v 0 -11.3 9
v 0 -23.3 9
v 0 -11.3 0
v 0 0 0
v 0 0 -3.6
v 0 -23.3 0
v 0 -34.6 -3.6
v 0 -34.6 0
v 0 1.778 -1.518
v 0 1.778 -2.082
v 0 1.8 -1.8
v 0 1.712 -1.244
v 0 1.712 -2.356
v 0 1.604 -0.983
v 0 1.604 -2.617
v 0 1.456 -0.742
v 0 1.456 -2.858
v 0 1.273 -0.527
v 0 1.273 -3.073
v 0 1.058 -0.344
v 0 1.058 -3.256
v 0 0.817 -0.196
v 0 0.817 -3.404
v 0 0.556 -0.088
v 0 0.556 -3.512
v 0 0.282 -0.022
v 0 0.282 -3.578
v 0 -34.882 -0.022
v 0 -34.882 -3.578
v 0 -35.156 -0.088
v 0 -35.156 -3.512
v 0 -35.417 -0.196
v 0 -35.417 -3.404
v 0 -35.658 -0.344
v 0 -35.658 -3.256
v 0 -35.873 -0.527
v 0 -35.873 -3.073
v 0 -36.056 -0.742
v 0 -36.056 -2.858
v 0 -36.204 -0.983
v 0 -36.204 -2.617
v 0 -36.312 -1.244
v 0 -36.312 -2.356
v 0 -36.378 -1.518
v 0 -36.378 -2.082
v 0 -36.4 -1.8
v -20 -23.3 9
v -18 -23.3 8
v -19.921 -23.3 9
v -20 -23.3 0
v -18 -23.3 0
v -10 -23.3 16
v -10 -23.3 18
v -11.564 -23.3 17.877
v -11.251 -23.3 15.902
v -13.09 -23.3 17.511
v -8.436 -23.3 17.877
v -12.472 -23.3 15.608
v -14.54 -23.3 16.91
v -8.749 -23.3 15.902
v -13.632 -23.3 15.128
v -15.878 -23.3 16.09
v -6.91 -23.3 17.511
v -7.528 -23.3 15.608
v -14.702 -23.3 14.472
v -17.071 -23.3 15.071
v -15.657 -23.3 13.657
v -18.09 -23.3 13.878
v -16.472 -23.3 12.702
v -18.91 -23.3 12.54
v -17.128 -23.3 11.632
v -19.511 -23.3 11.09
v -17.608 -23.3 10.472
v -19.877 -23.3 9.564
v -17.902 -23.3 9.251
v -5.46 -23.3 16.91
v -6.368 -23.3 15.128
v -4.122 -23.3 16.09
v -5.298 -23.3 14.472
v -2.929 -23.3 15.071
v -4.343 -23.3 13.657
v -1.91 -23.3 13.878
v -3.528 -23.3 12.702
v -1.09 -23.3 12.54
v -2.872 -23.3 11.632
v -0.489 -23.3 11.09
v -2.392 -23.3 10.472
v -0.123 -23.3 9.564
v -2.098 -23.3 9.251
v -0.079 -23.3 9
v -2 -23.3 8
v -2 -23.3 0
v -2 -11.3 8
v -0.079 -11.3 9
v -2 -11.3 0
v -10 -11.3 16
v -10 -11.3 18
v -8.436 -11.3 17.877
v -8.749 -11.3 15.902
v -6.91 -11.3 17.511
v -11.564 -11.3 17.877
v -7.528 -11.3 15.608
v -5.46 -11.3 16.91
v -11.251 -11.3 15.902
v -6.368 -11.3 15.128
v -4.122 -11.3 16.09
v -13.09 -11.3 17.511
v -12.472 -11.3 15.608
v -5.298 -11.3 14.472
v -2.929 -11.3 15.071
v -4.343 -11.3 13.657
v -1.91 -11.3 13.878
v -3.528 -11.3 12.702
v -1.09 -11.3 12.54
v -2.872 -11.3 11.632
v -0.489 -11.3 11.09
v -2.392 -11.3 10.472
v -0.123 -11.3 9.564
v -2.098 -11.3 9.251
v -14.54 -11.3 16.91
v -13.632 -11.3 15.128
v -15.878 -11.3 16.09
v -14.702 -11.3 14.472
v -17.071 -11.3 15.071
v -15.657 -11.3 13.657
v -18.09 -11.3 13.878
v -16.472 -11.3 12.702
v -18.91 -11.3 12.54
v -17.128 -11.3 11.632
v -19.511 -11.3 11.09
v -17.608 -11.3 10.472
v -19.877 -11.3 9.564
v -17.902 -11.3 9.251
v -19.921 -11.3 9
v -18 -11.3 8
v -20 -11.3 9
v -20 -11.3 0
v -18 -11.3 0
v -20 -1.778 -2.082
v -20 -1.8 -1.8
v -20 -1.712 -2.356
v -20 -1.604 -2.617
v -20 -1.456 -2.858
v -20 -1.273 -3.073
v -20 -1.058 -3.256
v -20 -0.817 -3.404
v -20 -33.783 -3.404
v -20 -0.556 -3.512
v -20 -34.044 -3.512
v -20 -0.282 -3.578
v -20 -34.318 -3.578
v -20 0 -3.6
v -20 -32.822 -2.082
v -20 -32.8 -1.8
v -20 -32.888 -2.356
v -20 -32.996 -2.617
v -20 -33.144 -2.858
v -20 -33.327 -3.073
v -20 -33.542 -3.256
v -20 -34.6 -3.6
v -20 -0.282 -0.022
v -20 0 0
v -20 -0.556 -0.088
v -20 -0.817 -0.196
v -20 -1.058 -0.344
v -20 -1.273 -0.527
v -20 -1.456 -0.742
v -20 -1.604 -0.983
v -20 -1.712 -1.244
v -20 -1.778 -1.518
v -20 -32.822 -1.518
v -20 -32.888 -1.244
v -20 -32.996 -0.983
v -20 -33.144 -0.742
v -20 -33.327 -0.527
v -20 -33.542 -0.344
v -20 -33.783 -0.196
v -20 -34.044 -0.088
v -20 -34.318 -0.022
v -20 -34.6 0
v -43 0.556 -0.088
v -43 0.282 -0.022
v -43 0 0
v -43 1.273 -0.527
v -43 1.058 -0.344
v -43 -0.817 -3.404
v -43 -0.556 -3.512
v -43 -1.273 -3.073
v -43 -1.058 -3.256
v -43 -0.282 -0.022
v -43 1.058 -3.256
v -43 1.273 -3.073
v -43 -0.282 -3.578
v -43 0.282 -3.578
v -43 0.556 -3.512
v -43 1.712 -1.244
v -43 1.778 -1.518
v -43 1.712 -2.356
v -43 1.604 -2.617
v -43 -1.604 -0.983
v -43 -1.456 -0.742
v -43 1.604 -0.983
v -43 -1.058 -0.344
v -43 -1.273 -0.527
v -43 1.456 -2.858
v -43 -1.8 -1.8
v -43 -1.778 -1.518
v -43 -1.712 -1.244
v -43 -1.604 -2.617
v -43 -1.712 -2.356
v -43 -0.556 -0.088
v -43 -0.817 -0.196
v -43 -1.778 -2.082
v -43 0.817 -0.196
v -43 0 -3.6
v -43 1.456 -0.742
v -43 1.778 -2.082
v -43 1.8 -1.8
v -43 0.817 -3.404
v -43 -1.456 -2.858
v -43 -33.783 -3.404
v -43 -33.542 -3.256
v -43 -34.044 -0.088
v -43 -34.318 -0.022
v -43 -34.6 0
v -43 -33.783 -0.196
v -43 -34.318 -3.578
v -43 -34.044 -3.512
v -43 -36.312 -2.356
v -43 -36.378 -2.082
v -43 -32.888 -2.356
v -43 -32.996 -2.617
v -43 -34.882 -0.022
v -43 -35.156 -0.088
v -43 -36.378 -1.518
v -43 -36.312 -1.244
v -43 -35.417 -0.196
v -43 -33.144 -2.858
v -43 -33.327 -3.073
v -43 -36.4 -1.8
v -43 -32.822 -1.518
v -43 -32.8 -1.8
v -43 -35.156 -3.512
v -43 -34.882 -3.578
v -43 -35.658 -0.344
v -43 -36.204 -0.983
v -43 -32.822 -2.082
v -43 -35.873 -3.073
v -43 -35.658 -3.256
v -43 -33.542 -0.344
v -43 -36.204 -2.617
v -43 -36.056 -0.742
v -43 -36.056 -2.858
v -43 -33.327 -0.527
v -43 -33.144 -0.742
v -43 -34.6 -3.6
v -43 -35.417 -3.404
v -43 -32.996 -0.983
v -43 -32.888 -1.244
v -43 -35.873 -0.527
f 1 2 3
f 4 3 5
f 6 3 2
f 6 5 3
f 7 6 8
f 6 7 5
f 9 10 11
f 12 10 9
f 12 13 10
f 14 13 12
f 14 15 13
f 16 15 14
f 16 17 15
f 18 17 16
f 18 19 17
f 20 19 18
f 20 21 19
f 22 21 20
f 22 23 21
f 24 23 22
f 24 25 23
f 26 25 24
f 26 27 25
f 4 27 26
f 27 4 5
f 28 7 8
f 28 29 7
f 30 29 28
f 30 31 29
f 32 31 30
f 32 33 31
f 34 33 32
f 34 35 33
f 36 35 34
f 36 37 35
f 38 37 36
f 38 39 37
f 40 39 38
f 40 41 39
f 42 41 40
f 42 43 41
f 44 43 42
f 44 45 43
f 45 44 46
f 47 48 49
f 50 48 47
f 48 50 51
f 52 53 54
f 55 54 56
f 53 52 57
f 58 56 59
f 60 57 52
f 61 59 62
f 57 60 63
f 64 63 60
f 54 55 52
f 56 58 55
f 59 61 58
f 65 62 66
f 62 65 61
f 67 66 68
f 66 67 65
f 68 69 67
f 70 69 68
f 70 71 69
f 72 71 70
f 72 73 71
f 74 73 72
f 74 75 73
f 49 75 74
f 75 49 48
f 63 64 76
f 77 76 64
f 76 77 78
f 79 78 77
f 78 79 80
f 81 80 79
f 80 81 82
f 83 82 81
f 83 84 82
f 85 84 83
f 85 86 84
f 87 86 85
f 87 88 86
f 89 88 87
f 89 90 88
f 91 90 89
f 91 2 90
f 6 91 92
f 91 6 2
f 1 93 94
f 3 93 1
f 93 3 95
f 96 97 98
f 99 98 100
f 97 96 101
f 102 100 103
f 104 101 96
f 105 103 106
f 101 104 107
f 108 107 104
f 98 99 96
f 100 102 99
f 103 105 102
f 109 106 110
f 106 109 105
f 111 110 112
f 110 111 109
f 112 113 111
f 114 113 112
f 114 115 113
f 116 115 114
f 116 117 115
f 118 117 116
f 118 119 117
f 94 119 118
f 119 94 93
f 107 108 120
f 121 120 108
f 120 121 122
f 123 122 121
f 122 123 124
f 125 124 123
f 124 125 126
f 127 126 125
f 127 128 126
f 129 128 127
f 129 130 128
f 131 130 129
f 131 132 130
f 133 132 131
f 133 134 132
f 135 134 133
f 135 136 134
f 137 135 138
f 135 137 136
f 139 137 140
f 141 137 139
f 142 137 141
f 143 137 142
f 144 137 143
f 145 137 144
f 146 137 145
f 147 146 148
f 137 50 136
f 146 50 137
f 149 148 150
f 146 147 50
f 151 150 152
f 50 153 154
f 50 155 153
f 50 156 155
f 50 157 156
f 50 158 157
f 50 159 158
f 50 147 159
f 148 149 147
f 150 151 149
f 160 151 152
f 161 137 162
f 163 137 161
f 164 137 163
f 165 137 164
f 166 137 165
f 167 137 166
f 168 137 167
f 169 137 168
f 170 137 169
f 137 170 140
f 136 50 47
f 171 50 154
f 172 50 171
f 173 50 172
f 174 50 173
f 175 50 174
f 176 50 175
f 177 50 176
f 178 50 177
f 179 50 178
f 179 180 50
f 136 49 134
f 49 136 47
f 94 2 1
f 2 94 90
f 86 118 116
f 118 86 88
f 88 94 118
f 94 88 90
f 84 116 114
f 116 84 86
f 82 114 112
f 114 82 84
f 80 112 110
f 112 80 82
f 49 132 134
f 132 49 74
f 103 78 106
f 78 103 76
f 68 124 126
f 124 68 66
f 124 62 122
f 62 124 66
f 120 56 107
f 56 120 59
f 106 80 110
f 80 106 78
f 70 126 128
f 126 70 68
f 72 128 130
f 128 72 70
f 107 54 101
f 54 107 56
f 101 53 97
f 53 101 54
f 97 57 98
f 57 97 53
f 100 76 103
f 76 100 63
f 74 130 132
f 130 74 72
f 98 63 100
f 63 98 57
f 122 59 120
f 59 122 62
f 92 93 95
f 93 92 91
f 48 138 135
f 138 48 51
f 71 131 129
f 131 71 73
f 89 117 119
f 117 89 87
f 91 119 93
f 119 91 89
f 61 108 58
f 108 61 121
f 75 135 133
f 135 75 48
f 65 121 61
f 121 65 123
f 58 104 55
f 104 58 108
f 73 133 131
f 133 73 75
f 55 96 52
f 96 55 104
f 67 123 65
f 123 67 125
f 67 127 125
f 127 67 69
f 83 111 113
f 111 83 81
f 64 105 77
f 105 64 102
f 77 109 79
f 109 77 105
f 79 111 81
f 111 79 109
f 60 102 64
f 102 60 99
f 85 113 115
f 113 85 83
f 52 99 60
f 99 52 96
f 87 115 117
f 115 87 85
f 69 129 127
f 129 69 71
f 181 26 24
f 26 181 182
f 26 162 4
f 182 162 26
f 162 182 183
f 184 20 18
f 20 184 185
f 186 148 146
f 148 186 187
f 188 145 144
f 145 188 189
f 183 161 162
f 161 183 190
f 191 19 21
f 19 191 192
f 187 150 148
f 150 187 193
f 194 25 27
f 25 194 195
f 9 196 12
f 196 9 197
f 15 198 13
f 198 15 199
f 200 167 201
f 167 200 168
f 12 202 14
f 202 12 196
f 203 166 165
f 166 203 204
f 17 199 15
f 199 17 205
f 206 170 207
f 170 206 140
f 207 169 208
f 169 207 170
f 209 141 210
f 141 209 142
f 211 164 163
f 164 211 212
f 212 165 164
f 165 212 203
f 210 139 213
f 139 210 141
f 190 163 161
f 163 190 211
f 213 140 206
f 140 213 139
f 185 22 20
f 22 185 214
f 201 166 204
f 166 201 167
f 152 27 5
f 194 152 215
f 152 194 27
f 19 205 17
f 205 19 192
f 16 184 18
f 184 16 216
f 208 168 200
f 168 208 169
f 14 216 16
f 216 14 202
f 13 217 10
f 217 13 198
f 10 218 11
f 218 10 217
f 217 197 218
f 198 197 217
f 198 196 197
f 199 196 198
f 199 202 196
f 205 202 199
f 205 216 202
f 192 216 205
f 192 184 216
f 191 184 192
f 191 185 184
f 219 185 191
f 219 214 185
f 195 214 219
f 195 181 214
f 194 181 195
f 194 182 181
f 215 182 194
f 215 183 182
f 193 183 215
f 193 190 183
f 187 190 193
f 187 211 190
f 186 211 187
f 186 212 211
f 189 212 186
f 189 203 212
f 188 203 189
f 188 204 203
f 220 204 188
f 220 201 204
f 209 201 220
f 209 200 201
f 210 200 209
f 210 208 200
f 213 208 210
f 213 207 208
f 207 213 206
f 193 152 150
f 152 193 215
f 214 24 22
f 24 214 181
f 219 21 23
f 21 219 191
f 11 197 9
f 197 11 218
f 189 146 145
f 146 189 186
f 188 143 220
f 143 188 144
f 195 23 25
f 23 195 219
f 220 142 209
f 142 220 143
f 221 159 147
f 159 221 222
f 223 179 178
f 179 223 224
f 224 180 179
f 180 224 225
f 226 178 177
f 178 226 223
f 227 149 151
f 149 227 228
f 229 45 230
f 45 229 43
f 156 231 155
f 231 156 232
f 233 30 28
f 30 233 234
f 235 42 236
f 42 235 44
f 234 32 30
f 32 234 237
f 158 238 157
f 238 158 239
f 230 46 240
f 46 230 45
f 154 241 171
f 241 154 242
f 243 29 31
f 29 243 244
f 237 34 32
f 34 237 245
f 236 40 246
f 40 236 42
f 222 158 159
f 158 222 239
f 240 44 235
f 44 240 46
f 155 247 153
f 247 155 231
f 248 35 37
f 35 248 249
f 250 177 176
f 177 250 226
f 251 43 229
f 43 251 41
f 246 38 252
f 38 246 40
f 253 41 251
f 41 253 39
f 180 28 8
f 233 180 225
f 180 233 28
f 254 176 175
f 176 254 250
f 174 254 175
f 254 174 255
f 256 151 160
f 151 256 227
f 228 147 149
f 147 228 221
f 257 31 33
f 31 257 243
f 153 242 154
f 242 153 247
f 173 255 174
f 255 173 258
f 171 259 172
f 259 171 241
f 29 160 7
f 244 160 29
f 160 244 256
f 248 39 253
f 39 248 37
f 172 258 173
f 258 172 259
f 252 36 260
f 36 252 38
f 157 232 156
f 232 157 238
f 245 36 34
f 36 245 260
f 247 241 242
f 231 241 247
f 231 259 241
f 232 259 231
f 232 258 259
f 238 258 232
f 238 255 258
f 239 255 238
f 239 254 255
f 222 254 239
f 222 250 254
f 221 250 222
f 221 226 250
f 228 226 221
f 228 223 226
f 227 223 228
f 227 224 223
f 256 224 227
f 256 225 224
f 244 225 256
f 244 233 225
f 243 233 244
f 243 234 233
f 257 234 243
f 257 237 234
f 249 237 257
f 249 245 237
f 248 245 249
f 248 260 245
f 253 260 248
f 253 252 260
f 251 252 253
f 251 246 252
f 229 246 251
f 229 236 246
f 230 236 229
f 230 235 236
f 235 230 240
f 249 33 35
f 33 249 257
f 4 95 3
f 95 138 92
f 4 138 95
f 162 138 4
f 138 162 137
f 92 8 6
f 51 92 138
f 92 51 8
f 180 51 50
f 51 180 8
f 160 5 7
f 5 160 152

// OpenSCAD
/*[holder plate]*/
//stick distance mm
hsd=34.6;
//stick length mm
hsl=25; 
//stick radius mm
hsr=1.8; 

/*[holder ring]*/
//width mm (min 10)
rw=16; 
//heigth mm
rh=12; 
//thickness mm
t=2; 
//elements of the arc
$fn=40;

rotate([90,0,0]) {
    //holder ring
    translate([-rw/2-t,rw/2,hsd/2]) {
        difference() {
            //outside
            union() {
                translate([0,-rw/4,0])
                cube([rw+2*t,(rw+2*t)/2,rh],center=true);
                cylinder(rh,rw/2+t,rw/2+t,center=true);
            }
            //cutout
            union() {
                translate([0,-rw/2,0])
                cube([rw,rw,rh*2],center=true);
                cylinder(rh*2,rw/2,rw/2,center=true);
            }
        }
    }

    //holder plate
    translate([-(rw+2*t),-hsr*2,0]) {
        cube([rw+2*t,hsr*2,hsd]);
    }
    //holder sticks
    translate([0,-hsr,0]) {
        rotate([270,0,90]) {
            cylinder(hsl+rw+t,hsr,hsr);
            translate([0,-hsd,0]) {
                cylinder(hsl+rw+t,hsr,hsr);
            }
        }
    }
    
}
